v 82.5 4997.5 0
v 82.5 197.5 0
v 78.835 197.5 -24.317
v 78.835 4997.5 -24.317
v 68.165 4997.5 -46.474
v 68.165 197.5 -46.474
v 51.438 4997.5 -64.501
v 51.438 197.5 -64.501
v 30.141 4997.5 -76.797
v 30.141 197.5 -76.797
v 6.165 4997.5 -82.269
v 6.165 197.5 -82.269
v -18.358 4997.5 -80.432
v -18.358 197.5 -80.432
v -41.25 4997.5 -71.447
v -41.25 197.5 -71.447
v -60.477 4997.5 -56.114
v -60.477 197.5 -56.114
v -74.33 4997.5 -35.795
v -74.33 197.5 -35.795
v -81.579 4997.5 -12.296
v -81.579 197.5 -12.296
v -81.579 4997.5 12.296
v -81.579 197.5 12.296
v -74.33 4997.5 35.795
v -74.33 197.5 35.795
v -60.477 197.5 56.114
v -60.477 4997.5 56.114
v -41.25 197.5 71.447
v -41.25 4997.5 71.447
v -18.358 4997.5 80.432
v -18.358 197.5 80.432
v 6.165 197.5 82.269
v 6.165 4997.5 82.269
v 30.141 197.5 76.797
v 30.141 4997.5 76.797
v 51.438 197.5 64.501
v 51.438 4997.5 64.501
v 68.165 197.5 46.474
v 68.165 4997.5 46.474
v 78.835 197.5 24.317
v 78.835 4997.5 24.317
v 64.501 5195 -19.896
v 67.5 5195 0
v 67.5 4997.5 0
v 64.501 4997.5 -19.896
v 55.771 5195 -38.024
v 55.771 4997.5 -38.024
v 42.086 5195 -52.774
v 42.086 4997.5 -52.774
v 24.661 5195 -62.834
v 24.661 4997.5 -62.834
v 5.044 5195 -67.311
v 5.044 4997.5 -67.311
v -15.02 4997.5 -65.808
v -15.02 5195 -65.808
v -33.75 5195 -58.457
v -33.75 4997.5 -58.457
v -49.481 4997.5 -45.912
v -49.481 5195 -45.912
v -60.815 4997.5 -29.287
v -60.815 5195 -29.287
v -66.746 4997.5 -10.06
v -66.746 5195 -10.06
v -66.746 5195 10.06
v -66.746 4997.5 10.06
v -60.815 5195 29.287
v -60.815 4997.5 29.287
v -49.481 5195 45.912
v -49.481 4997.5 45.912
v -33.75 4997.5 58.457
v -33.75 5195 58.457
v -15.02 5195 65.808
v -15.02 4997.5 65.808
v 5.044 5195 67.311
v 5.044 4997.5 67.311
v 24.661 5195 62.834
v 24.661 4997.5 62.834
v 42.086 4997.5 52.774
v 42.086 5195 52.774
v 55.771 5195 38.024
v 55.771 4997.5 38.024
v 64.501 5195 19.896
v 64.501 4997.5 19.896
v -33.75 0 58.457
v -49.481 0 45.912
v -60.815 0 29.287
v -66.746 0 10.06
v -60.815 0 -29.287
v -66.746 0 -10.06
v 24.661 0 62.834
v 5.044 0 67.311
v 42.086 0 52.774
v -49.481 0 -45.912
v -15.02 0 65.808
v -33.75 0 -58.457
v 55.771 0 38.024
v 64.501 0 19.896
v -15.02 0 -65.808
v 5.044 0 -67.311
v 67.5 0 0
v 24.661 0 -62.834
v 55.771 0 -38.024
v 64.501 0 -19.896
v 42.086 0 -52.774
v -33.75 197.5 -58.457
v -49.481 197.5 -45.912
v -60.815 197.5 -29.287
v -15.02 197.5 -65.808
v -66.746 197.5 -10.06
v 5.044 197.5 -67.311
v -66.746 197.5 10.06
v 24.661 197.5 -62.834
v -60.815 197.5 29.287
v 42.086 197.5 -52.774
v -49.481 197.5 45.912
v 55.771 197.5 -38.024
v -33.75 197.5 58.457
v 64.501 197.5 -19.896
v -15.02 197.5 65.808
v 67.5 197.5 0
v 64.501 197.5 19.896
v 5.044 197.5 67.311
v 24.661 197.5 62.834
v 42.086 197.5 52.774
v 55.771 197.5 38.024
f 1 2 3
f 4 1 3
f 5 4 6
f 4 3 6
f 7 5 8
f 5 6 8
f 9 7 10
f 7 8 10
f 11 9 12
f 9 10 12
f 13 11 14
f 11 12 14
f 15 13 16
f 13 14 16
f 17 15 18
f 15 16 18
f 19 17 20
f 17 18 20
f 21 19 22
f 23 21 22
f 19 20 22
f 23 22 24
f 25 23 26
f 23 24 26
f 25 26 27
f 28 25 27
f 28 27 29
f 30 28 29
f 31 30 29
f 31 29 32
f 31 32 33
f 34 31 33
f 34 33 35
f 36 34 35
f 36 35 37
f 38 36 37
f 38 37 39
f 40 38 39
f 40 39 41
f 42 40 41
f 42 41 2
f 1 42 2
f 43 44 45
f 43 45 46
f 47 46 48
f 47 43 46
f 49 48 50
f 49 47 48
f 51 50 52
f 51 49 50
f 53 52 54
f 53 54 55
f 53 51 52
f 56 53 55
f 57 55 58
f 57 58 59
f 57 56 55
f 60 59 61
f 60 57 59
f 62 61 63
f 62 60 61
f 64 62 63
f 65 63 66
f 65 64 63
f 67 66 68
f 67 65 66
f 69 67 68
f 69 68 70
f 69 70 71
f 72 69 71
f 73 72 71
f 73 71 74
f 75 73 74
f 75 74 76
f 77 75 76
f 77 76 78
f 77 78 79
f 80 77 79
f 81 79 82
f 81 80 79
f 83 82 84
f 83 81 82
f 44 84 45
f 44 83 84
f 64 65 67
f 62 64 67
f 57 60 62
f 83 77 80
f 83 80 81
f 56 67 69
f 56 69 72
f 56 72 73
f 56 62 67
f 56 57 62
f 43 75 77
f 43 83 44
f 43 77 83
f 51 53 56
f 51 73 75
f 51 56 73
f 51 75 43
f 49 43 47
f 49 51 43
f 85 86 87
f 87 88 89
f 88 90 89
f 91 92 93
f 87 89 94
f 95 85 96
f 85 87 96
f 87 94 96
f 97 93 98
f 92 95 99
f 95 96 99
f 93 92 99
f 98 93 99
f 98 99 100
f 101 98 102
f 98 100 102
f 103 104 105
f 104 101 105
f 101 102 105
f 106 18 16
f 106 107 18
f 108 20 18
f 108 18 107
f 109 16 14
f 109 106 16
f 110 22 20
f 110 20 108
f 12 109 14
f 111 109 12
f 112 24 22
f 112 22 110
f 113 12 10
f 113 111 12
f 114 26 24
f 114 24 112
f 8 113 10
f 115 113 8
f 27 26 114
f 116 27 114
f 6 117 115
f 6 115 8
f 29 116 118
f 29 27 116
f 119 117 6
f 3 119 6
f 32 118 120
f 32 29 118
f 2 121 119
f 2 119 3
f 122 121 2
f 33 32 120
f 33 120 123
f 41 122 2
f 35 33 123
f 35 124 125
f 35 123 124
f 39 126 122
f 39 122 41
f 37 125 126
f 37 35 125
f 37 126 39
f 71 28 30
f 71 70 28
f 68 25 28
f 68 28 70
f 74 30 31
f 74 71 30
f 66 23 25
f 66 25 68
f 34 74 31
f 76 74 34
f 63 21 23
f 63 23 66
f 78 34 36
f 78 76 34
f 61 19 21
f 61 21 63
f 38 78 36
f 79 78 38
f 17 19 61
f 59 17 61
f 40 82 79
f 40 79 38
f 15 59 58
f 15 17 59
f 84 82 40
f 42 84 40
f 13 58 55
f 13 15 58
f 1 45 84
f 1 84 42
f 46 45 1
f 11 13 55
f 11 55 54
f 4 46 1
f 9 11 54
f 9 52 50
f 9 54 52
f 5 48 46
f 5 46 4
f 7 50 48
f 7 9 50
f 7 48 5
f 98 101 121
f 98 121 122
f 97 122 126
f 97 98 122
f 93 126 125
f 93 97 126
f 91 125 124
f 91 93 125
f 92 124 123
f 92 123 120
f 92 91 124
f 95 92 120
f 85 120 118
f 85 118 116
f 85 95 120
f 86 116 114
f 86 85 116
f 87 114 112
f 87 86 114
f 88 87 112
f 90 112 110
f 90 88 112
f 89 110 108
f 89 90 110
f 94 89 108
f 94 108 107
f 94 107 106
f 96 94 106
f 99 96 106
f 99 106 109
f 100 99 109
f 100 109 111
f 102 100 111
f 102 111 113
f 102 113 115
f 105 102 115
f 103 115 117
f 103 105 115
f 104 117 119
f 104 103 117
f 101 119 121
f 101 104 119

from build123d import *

# Parameters (mm, degrees)
SKETCH1_R           = 82.5
BOSS_EXTRUDE1_DEPTH = 5195
SKETCH2_R           = 82.5
SKETCH2_R_2         = 67.5
CUT_EXTRUDE1_DEPTH  = 197.5
SKETCH3_R           = 82.5
SKETCH3_R_2         = 67.5
CUT_EXTRUDE2_DEPTH  = 197.5


with BuildPart() as part:
    # Sketch1 → Boss-Extrude1 (new body)
    with BuildSketch(Plane(origin=(0, 0, 0), x_dir=(1, 0, 0), z_dir=(0, 1, 0))):
        Circle(SKETCH1_R)
    extrude(amount=BOSS_EXTRUDE1_DEPTH)

    # Sketch2 → Cut-Extrude1 (cut)
    with BuildSketch(Plane.XZ):
        Circle(SKETCH2_R)
        Circle(SKETCH2_R_2, mode=Mode.SUBTRACT)
    extrude(amount=-CUT_EXTRUDE1_DEPTH, mode=Mode.SUBTRACT)

    # Sketch3 → Cut-Extrude2 (cut)
    with BuildSketch(Plane(origin=(0, 5195, 0), x_dir=(1, 0, 0), z_dir=(0, 1, 0))):
        Circle(SKETCH3_R)
        Circle(SKETCH3_R_2, mode=Mode.SUBTRACT)
    extrude(amount=-CUT_EXTRUDE2_DEPTH, mode=Mode.SUBTRACT)


solid = part.part
